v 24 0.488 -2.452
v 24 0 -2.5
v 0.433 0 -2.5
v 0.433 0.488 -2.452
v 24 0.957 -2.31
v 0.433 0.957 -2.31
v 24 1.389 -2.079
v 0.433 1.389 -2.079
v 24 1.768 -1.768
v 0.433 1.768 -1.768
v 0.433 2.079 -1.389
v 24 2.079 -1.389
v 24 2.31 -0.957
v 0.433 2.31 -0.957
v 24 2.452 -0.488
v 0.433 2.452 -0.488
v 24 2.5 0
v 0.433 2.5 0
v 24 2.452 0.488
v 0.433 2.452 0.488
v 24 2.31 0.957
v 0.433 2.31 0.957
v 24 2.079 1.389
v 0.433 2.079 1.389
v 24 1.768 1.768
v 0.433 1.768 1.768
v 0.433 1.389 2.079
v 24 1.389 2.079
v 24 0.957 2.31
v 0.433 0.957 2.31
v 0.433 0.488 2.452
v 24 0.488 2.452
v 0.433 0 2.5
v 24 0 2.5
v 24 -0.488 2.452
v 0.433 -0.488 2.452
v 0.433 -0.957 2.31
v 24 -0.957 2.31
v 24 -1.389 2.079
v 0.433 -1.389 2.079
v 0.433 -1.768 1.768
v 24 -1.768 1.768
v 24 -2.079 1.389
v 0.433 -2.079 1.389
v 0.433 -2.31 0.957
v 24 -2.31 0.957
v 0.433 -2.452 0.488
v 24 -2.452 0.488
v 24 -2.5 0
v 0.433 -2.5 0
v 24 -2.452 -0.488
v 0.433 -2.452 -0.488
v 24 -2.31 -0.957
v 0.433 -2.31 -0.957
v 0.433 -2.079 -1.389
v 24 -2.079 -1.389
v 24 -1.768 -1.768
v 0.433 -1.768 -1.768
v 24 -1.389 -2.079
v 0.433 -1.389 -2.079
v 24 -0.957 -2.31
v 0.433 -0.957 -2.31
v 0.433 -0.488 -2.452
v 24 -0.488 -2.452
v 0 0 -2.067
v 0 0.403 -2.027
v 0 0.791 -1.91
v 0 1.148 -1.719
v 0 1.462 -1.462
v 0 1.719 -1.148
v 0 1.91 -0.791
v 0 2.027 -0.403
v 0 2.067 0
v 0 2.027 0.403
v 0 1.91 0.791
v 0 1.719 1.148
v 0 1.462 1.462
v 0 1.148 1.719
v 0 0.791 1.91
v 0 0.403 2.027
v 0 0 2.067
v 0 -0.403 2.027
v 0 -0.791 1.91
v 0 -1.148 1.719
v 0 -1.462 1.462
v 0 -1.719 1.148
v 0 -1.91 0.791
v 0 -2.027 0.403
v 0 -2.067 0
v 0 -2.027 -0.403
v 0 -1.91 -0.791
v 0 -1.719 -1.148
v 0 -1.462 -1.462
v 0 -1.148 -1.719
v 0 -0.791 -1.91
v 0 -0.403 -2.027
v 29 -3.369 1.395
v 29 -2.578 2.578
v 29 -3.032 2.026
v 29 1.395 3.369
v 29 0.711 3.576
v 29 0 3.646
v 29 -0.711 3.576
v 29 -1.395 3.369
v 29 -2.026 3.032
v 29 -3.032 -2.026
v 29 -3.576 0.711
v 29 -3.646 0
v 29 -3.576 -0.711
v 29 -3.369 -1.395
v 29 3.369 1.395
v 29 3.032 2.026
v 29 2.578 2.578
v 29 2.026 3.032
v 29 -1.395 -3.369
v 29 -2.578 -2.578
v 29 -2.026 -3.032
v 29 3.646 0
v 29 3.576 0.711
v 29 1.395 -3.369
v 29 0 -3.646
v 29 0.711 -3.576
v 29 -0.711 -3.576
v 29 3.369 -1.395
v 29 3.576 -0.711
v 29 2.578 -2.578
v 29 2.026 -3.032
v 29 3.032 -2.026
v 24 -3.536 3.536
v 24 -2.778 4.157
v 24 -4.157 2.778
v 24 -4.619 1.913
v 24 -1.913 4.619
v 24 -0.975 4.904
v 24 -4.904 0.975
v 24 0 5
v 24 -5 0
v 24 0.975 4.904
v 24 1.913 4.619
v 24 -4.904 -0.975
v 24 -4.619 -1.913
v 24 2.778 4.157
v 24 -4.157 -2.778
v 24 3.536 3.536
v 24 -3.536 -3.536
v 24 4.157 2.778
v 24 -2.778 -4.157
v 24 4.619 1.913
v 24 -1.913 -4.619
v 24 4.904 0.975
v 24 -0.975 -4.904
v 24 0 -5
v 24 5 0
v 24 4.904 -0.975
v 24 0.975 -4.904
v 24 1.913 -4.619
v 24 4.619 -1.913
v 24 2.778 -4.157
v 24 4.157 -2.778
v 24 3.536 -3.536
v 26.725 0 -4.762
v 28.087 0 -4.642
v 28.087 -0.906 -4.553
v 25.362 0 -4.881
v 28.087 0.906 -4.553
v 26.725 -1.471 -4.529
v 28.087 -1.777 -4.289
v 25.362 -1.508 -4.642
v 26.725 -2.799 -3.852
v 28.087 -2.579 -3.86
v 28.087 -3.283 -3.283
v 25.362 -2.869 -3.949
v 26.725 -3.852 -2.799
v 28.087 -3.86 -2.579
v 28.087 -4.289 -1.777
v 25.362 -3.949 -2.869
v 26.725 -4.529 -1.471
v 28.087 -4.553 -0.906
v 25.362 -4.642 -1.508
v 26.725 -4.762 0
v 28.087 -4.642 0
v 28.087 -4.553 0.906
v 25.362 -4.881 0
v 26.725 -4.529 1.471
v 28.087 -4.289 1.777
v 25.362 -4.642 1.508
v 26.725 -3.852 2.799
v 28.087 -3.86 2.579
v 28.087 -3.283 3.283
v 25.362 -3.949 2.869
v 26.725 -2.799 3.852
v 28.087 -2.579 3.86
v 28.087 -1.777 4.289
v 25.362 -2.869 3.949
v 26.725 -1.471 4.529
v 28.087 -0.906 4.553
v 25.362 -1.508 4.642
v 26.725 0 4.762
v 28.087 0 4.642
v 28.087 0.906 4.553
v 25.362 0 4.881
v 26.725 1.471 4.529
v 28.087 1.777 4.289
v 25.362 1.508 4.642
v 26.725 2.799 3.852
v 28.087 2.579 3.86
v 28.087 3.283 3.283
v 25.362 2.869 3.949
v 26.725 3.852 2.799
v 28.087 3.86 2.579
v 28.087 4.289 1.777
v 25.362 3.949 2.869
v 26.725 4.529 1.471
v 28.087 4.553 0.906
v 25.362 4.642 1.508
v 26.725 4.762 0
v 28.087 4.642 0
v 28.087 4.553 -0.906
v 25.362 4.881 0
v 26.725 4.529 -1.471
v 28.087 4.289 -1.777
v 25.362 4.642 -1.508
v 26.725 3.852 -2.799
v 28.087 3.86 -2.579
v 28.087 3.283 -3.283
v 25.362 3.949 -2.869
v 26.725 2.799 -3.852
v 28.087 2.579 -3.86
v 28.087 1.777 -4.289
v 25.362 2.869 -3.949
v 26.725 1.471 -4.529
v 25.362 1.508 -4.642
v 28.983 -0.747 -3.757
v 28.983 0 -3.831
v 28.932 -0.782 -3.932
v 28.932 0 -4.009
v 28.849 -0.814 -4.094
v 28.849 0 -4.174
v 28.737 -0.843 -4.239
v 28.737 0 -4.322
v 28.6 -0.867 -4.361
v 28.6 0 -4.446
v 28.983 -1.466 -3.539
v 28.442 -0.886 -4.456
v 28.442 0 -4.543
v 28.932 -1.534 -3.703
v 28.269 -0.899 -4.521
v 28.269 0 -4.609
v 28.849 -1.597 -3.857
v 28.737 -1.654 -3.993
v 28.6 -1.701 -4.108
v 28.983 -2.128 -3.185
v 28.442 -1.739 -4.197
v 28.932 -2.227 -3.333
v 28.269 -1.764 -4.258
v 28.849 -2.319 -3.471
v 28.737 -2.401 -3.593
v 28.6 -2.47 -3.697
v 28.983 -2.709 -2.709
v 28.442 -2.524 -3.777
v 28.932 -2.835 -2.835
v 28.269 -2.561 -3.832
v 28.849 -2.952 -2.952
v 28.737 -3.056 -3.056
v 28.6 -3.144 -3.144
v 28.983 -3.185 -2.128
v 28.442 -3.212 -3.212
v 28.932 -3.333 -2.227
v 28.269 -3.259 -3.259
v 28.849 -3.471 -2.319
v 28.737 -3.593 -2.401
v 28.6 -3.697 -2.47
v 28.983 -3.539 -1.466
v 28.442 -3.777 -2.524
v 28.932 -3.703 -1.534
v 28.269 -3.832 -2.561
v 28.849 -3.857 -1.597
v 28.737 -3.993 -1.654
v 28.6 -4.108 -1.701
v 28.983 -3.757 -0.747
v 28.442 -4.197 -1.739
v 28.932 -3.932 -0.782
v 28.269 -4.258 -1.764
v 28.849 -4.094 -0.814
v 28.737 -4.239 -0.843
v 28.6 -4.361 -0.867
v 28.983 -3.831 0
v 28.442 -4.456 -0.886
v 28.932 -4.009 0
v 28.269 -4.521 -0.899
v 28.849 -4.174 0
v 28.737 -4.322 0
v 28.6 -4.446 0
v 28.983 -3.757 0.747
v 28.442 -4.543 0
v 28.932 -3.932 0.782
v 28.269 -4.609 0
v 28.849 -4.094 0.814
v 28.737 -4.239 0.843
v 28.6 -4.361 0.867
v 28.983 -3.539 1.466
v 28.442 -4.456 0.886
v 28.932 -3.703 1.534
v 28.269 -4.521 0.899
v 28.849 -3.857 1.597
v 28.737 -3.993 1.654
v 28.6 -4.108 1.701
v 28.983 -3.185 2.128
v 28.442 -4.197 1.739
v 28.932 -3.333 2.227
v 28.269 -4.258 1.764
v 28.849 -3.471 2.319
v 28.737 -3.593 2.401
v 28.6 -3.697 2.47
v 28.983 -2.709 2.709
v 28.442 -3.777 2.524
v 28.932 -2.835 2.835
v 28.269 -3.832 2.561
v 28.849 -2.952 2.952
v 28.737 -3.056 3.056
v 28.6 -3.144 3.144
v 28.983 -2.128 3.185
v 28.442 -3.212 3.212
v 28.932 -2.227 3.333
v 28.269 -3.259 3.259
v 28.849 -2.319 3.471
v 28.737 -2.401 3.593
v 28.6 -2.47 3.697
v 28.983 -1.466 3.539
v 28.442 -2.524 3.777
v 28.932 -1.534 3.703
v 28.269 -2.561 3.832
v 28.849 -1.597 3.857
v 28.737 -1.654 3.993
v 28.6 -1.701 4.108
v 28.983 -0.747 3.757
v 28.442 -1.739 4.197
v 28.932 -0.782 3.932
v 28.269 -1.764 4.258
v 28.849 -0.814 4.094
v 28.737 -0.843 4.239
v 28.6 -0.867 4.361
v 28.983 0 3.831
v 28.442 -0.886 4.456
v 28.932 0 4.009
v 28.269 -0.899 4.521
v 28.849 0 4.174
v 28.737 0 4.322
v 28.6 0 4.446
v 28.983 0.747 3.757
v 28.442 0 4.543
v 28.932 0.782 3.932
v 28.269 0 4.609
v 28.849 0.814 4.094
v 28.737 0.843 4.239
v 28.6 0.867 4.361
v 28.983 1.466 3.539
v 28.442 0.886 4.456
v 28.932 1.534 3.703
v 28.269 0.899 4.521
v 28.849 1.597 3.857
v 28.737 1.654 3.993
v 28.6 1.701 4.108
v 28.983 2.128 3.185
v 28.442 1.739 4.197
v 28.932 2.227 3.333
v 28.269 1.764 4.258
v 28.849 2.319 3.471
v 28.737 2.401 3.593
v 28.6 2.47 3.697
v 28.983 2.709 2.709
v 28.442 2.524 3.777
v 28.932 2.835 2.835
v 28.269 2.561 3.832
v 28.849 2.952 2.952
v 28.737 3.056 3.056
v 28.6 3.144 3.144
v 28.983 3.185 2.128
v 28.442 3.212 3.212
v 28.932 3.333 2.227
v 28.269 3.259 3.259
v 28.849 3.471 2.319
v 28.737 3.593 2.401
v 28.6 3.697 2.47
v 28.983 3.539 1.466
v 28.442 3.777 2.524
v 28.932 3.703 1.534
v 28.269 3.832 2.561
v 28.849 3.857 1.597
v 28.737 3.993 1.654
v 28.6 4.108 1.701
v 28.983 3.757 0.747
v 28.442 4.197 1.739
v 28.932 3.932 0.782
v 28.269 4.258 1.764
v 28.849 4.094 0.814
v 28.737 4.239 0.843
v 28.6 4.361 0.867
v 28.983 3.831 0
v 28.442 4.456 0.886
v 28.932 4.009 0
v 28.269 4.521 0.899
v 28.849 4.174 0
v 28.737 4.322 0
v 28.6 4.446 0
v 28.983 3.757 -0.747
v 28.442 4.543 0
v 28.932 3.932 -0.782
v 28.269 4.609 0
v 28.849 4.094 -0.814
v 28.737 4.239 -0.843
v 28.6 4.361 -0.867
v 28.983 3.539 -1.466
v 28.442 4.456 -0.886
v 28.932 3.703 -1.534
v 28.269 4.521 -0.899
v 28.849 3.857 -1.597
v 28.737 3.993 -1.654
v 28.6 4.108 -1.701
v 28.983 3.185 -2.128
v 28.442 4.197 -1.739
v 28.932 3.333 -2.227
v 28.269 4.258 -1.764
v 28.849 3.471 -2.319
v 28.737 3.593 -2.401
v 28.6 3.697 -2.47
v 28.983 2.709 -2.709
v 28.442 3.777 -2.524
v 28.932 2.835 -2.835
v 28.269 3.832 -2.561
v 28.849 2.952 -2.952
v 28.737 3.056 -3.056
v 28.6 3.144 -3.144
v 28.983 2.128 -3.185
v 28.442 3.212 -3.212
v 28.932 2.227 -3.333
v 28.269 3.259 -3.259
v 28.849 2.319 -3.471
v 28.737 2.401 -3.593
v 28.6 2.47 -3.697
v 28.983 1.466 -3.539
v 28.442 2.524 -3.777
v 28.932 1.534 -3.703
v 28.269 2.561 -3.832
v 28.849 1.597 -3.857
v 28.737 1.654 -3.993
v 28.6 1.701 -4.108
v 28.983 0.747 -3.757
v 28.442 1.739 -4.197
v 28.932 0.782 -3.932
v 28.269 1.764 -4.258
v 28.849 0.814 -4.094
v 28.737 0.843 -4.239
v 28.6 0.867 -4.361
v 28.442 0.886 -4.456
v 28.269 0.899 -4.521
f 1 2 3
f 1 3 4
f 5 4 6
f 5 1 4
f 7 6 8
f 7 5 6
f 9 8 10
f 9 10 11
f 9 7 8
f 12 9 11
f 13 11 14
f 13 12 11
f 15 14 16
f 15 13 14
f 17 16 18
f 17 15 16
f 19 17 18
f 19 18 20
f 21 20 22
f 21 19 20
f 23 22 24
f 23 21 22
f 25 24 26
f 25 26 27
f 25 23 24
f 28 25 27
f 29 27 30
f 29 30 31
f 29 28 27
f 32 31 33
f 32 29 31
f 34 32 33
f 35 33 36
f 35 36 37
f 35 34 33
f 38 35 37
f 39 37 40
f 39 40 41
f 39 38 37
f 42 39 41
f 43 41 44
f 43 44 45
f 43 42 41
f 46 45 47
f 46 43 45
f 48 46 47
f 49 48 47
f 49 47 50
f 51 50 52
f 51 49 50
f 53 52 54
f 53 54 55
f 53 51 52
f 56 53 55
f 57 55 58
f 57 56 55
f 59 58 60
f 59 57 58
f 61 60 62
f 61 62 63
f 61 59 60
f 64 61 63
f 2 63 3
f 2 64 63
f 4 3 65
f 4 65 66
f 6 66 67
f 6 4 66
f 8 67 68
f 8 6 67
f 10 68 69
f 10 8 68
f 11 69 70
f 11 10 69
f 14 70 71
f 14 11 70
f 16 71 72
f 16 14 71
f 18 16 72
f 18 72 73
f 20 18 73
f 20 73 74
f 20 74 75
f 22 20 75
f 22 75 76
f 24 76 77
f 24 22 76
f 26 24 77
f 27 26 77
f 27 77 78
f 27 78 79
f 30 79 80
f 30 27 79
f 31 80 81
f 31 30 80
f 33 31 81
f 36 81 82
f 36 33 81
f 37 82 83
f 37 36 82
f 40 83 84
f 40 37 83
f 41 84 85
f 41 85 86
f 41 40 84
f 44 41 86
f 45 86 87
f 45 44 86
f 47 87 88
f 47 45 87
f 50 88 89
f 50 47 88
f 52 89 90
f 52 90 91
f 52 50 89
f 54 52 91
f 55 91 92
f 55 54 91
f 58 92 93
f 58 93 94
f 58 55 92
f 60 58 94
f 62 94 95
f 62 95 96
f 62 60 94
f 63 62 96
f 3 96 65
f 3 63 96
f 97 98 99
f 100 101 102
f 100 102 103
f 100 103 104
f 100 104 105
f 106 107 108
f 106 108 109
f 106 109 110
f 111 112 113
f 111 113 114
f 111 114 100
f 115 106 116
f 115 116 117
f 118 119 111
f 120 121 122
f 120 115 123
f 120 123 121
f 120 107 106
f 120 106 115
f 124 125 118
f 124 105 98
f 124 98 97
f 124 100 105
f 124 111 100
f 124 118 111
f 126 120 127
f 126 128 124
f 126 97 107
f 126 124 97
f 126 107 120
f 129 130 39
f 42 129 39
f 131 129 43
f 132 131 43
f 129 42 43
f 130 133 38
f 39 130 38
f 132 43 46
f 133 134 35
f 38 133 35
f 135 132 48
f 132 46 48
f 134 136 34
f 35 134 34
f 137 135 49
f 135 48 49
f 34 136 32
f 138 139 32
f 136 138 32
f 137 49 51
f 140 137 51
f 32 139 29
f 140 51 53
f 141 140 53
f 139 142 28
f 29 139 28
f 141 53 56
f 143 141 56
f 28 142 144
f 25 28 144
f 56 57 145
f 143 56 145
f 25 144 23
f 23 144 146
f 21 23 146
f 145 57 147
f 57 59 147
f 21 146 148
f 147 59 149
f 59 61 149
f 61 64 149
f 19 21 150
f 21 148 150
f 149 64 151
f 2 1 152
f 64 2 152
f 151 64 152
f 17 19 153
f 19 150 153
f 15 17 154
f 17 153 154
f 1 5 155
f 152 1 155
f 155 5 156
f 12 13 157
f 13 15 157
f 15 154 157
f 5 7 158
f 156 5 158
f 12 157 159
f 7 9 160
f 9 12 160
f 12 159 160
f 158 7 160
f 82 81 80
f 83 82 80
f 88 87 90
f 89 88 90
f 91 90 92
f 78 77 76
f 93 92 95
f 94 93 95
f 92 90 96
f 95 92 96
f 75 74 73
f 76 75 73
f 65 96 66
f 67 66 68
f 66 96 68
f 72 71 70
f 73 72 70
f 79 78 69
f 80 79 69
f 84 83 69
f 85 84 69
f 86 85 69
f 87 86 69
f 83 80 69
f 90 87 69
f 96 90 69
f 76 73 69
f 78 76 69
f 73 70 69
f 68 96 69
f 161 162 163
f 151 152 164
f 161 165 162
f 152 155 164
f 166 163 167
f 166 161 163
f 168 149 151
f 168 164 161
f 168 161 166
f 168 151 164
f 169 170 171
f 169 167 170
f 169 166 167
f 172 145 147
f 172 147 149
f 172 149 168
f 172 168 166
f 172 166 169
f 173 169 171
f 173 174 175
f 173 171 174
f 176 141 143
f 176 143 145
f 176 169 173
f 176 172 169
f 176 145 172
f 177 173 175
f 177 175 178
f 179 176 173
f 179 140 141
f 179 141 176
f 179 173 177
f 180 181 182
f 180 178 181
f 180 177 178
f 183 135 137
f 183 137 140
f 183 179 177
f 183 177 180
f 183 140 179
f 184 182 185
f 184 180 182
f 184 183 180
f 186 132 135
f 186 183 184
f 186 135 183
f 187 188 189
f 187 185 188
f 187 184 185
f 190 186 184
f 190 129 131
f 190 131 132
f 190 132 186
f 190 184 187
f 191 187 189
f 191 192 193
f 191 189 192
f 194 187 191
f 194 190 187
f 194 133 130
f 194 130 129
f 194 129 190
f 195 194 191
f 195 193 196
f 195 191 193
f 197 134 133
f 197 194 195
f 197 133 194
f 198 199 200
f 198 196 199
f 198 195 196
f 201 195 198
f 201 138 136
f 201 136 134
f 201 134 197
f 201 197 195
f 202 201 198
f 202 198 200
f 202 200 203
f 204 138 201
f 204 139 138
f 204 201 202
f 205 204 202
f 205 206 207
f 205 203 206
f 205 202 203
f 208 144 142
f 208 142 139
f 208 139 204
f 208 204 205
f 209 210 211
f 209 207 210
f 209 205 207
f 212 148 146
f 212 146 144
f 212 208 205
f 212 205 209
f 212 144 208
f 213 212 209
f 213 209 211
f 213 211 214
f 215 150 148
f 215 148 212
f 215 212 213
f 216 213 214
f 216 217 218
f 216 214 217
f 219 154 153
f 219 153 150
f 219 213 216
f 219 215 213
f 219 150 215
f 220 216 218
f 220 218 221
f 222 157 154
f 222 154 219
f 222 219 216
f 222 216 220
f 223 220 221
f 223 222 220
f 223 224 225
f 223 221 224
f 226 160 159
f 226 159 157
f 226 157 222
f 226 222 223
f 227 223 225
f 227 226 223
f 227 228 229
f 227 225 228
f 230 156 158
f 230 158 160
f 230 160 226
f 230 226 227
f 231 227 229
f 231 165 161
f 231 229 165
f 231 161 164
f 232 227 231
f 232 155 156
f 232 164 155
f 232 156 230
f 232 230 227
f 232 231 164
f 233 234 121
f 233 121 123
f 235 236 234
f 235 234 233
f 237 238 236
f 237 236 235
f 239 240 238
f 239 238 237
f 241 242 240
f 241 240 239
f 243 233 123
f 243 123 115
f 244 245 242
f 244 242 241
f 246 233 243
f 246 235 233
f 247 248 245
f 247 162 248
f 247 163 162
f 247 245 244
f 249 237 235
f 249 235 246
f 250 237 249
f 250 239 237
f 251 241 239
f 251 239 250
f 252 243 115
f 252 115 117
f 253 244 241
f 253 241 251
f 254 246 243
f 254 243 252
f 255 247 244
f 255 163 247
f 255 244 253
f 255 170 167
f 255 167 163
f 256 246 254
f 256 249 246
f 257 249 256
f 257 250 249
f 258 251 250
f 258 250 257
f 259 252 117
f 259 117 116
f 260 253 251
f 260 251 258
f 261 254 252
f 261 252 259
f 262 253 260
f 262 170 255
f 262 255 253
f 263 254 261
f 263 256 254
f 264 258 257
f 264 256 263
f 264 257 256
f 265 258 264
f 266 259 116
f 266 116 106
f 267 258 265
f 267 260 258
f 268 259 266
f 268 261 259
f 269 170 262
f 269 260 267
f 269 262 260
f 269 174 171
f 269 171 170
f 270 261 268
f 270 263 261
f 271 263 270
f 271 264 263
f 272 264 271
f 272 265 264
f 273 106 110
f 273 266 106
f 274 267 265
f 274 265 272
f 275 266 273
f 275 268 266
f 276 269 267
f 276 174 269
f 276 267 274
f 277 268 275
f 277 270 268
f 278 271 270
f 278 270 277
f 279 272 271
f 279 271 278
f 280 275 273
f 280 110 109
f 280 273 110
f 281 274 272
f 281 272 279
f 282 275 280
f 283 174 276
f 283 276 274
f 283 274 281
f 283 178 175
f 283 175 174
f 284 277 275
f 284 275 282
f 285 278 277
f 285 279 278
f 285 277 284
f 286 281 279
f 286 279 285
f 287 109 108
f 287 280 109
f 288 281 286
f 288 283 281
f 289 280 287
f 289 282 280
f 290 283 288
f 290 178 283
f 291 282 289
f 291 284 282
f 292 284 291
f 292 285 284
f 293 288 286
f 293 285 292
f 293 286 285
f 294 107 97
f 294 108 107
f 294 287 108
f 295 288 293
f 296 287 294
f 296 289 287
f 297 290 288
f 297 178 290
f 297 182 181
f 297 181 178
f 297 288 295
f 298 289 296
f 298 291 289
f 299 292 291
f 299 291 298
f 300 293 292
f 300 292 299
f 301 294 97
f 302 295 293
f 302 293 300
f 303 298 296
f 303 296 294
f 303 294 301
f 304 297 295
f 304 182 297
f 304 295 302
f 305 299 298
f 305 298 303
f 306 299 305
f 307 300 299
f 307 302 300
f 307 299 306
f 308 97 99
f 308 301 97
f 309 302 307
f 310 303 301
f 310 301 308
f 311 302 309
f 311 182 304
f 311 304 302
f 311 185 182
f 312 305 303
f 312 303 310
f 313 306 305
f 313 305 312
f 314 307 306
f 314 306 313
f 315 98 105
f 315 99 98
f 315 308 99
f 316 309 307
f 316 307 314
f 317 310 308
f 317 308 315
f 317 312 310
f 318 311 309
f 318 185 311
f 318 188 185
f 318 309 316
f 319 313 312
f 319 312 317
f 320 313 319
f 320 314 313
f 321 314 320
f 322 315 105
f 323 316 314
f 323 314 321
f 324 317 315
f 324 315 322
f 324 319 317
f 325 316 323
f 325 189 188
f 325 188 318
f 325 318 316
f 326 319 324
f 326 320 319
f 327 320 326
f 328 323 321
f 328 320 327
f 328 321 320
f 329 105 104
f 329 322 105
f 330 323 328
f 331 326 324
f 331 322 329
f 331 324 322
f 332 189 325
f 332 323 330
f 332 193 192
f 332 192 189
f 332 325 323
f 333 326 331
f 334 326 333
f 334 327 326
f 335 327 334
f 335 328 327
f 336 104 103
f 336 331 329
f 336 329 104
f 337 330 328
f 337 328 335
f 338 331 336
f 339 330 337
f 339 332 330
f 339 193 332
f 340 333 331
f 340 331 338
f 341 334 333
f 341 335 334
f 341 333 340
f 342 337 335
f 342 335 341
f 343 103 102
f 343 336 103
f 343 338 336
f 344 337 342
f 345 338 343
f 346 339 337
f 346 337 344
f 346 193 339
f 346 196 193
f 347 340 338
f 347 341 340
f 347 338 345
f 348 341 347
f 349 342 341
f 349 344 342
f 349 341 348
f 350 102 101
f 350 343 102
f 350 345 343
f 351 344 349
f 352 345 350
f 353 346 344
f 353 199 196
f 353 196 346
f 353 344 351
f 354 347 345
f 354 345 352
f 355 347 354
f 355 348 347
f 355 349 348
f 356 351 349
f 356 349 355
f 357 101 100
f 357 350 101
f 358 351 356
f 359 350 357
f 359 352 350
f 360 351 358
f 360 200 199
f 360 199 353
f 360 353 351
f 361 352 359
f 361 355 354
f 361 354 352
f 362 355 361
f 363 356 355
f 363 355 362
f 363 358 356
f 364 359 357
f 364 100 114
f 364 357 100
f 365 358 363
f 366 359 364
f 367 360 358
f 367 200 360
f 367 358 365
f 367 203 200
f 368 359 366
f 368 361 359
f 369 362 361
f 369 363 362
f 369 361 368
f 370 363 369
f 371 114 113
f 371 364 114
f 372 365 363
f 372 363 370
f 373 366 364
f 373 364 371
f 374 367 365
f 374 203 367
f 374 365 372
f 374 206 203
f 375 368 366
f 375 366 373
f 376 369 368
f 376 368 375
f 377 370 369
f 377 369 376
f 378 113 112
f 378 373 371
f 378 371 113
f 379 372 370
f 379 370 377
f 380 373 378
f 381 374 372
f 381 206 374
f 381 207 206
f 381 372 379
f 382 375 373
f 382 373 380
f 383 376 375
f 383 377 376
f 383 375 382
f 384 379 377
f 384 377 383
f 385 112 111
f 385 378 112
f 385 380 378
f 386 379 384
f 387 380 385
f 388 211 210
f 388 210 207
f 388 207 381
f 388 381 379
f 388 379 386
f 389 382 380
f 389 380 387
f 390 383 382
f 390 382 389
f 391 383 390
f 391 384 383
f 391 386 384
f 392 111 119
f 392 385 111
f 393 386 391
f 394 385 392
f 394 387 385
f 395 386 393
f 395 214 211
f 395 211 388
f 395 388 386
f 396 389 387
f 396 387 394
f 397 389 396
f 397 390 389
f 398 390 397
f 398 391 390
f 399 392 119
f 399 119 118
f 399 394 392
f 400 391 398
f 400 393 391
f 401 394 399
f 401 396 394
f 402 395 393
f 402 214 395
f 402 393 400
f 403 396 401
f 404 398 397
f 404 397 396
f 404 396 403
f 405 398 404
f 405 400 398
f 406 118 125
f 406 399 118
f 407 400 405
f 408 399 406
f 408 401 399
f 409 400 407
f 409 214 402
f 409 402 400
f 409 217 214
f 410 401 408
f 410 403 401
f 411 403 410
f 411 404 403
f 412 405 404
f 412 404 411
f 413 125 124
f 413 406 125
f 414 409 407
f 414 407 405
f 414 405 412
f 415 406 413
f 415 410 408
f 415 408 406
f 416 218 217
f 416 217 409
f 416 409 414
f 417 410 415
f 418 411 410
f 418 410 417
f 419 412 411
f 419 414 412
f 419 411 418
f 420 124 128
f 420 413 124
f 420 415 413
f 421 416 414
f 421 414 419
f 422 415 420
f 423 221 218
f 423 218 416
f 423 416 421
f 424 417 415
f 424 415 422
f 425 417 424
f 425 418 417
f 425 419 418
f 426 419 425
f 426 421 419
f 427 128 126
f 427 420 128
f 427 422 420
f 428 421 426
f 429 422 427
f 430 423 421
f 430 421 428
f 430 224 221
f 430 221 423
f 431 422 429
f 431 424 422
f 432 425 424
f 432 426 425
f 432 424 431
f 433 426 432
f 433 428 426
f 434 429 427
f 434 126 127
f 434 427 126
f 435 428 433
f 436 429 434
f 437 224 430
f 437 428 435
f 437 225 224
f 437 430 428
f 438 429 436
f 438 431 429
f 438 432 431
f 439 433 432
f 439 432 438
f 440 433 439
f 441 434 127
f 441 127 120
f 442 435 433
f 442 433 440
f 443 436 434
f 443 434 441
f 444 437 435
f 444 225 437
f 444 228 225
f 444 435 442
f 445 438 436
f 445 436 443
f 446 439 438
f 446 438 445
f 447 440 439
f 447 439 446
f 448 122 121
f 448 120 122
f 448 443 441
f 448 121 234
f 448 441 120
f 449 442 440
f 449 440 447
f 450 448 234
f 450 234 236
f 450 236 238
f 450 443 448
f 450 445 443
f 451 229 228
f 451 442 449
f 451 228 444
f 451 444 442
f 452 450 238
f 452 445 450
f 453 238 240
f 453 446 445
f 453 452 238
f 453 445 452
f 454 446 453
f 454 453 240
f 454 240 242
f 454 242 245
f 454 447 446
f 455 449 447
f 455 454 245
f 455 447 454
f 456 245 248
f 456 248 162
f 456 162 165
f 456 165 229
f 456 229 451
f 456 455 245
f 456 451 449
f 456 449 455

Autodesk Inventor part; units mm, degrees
sketch "Skizze_1" plane through (0, 0, 0) normal (0, 1, 0) x (-1, 0, 0)
  line L0 (-29, 0) -> (0, 0)
  line L1 (0, 0) -> (0, -2.067)
  line L2 (0, -2.067) -> (-0.433, -2.5)
  line L3 (-0.433, -2.5) -> (-24, -2.5)
  line L4 (-24, -2.5) -> (-24, -5)
  line L5 (-24, -5) -> (-28.0872, -4.6424)
  arc A0 (-29, -3.6462) -> (-28.0872, -4.6424) centre (-28, -3.6462) ccw
  line L6 (-29, -3.6462) -> (-29, 0)
  line L7 (-29, 0) -> (0, 0)
revolve "Revolution1" add sketch "Skizze_1" angle 360 about axis through (29, 0, 0) along (1, 0, 0)
thread "Thread1" size "M5x0.8" class "6g" standard "ISO Metric profile" length 23.5 offset 0.5
ref_plane "AS_XY" through (12.5, 0, 0) normal (1, 0, 0) x (0, 0, -1)
ref_plane "AS_YZ" through (12.5, 0, 0) normal (0, 0, -1) x (0, 1, 0)
ref_plane "AS_ZX" through (12.5, 0, 0) normal (0, 1, 0) x (1, 0, 0)
properties part number "305208-KOMP"
